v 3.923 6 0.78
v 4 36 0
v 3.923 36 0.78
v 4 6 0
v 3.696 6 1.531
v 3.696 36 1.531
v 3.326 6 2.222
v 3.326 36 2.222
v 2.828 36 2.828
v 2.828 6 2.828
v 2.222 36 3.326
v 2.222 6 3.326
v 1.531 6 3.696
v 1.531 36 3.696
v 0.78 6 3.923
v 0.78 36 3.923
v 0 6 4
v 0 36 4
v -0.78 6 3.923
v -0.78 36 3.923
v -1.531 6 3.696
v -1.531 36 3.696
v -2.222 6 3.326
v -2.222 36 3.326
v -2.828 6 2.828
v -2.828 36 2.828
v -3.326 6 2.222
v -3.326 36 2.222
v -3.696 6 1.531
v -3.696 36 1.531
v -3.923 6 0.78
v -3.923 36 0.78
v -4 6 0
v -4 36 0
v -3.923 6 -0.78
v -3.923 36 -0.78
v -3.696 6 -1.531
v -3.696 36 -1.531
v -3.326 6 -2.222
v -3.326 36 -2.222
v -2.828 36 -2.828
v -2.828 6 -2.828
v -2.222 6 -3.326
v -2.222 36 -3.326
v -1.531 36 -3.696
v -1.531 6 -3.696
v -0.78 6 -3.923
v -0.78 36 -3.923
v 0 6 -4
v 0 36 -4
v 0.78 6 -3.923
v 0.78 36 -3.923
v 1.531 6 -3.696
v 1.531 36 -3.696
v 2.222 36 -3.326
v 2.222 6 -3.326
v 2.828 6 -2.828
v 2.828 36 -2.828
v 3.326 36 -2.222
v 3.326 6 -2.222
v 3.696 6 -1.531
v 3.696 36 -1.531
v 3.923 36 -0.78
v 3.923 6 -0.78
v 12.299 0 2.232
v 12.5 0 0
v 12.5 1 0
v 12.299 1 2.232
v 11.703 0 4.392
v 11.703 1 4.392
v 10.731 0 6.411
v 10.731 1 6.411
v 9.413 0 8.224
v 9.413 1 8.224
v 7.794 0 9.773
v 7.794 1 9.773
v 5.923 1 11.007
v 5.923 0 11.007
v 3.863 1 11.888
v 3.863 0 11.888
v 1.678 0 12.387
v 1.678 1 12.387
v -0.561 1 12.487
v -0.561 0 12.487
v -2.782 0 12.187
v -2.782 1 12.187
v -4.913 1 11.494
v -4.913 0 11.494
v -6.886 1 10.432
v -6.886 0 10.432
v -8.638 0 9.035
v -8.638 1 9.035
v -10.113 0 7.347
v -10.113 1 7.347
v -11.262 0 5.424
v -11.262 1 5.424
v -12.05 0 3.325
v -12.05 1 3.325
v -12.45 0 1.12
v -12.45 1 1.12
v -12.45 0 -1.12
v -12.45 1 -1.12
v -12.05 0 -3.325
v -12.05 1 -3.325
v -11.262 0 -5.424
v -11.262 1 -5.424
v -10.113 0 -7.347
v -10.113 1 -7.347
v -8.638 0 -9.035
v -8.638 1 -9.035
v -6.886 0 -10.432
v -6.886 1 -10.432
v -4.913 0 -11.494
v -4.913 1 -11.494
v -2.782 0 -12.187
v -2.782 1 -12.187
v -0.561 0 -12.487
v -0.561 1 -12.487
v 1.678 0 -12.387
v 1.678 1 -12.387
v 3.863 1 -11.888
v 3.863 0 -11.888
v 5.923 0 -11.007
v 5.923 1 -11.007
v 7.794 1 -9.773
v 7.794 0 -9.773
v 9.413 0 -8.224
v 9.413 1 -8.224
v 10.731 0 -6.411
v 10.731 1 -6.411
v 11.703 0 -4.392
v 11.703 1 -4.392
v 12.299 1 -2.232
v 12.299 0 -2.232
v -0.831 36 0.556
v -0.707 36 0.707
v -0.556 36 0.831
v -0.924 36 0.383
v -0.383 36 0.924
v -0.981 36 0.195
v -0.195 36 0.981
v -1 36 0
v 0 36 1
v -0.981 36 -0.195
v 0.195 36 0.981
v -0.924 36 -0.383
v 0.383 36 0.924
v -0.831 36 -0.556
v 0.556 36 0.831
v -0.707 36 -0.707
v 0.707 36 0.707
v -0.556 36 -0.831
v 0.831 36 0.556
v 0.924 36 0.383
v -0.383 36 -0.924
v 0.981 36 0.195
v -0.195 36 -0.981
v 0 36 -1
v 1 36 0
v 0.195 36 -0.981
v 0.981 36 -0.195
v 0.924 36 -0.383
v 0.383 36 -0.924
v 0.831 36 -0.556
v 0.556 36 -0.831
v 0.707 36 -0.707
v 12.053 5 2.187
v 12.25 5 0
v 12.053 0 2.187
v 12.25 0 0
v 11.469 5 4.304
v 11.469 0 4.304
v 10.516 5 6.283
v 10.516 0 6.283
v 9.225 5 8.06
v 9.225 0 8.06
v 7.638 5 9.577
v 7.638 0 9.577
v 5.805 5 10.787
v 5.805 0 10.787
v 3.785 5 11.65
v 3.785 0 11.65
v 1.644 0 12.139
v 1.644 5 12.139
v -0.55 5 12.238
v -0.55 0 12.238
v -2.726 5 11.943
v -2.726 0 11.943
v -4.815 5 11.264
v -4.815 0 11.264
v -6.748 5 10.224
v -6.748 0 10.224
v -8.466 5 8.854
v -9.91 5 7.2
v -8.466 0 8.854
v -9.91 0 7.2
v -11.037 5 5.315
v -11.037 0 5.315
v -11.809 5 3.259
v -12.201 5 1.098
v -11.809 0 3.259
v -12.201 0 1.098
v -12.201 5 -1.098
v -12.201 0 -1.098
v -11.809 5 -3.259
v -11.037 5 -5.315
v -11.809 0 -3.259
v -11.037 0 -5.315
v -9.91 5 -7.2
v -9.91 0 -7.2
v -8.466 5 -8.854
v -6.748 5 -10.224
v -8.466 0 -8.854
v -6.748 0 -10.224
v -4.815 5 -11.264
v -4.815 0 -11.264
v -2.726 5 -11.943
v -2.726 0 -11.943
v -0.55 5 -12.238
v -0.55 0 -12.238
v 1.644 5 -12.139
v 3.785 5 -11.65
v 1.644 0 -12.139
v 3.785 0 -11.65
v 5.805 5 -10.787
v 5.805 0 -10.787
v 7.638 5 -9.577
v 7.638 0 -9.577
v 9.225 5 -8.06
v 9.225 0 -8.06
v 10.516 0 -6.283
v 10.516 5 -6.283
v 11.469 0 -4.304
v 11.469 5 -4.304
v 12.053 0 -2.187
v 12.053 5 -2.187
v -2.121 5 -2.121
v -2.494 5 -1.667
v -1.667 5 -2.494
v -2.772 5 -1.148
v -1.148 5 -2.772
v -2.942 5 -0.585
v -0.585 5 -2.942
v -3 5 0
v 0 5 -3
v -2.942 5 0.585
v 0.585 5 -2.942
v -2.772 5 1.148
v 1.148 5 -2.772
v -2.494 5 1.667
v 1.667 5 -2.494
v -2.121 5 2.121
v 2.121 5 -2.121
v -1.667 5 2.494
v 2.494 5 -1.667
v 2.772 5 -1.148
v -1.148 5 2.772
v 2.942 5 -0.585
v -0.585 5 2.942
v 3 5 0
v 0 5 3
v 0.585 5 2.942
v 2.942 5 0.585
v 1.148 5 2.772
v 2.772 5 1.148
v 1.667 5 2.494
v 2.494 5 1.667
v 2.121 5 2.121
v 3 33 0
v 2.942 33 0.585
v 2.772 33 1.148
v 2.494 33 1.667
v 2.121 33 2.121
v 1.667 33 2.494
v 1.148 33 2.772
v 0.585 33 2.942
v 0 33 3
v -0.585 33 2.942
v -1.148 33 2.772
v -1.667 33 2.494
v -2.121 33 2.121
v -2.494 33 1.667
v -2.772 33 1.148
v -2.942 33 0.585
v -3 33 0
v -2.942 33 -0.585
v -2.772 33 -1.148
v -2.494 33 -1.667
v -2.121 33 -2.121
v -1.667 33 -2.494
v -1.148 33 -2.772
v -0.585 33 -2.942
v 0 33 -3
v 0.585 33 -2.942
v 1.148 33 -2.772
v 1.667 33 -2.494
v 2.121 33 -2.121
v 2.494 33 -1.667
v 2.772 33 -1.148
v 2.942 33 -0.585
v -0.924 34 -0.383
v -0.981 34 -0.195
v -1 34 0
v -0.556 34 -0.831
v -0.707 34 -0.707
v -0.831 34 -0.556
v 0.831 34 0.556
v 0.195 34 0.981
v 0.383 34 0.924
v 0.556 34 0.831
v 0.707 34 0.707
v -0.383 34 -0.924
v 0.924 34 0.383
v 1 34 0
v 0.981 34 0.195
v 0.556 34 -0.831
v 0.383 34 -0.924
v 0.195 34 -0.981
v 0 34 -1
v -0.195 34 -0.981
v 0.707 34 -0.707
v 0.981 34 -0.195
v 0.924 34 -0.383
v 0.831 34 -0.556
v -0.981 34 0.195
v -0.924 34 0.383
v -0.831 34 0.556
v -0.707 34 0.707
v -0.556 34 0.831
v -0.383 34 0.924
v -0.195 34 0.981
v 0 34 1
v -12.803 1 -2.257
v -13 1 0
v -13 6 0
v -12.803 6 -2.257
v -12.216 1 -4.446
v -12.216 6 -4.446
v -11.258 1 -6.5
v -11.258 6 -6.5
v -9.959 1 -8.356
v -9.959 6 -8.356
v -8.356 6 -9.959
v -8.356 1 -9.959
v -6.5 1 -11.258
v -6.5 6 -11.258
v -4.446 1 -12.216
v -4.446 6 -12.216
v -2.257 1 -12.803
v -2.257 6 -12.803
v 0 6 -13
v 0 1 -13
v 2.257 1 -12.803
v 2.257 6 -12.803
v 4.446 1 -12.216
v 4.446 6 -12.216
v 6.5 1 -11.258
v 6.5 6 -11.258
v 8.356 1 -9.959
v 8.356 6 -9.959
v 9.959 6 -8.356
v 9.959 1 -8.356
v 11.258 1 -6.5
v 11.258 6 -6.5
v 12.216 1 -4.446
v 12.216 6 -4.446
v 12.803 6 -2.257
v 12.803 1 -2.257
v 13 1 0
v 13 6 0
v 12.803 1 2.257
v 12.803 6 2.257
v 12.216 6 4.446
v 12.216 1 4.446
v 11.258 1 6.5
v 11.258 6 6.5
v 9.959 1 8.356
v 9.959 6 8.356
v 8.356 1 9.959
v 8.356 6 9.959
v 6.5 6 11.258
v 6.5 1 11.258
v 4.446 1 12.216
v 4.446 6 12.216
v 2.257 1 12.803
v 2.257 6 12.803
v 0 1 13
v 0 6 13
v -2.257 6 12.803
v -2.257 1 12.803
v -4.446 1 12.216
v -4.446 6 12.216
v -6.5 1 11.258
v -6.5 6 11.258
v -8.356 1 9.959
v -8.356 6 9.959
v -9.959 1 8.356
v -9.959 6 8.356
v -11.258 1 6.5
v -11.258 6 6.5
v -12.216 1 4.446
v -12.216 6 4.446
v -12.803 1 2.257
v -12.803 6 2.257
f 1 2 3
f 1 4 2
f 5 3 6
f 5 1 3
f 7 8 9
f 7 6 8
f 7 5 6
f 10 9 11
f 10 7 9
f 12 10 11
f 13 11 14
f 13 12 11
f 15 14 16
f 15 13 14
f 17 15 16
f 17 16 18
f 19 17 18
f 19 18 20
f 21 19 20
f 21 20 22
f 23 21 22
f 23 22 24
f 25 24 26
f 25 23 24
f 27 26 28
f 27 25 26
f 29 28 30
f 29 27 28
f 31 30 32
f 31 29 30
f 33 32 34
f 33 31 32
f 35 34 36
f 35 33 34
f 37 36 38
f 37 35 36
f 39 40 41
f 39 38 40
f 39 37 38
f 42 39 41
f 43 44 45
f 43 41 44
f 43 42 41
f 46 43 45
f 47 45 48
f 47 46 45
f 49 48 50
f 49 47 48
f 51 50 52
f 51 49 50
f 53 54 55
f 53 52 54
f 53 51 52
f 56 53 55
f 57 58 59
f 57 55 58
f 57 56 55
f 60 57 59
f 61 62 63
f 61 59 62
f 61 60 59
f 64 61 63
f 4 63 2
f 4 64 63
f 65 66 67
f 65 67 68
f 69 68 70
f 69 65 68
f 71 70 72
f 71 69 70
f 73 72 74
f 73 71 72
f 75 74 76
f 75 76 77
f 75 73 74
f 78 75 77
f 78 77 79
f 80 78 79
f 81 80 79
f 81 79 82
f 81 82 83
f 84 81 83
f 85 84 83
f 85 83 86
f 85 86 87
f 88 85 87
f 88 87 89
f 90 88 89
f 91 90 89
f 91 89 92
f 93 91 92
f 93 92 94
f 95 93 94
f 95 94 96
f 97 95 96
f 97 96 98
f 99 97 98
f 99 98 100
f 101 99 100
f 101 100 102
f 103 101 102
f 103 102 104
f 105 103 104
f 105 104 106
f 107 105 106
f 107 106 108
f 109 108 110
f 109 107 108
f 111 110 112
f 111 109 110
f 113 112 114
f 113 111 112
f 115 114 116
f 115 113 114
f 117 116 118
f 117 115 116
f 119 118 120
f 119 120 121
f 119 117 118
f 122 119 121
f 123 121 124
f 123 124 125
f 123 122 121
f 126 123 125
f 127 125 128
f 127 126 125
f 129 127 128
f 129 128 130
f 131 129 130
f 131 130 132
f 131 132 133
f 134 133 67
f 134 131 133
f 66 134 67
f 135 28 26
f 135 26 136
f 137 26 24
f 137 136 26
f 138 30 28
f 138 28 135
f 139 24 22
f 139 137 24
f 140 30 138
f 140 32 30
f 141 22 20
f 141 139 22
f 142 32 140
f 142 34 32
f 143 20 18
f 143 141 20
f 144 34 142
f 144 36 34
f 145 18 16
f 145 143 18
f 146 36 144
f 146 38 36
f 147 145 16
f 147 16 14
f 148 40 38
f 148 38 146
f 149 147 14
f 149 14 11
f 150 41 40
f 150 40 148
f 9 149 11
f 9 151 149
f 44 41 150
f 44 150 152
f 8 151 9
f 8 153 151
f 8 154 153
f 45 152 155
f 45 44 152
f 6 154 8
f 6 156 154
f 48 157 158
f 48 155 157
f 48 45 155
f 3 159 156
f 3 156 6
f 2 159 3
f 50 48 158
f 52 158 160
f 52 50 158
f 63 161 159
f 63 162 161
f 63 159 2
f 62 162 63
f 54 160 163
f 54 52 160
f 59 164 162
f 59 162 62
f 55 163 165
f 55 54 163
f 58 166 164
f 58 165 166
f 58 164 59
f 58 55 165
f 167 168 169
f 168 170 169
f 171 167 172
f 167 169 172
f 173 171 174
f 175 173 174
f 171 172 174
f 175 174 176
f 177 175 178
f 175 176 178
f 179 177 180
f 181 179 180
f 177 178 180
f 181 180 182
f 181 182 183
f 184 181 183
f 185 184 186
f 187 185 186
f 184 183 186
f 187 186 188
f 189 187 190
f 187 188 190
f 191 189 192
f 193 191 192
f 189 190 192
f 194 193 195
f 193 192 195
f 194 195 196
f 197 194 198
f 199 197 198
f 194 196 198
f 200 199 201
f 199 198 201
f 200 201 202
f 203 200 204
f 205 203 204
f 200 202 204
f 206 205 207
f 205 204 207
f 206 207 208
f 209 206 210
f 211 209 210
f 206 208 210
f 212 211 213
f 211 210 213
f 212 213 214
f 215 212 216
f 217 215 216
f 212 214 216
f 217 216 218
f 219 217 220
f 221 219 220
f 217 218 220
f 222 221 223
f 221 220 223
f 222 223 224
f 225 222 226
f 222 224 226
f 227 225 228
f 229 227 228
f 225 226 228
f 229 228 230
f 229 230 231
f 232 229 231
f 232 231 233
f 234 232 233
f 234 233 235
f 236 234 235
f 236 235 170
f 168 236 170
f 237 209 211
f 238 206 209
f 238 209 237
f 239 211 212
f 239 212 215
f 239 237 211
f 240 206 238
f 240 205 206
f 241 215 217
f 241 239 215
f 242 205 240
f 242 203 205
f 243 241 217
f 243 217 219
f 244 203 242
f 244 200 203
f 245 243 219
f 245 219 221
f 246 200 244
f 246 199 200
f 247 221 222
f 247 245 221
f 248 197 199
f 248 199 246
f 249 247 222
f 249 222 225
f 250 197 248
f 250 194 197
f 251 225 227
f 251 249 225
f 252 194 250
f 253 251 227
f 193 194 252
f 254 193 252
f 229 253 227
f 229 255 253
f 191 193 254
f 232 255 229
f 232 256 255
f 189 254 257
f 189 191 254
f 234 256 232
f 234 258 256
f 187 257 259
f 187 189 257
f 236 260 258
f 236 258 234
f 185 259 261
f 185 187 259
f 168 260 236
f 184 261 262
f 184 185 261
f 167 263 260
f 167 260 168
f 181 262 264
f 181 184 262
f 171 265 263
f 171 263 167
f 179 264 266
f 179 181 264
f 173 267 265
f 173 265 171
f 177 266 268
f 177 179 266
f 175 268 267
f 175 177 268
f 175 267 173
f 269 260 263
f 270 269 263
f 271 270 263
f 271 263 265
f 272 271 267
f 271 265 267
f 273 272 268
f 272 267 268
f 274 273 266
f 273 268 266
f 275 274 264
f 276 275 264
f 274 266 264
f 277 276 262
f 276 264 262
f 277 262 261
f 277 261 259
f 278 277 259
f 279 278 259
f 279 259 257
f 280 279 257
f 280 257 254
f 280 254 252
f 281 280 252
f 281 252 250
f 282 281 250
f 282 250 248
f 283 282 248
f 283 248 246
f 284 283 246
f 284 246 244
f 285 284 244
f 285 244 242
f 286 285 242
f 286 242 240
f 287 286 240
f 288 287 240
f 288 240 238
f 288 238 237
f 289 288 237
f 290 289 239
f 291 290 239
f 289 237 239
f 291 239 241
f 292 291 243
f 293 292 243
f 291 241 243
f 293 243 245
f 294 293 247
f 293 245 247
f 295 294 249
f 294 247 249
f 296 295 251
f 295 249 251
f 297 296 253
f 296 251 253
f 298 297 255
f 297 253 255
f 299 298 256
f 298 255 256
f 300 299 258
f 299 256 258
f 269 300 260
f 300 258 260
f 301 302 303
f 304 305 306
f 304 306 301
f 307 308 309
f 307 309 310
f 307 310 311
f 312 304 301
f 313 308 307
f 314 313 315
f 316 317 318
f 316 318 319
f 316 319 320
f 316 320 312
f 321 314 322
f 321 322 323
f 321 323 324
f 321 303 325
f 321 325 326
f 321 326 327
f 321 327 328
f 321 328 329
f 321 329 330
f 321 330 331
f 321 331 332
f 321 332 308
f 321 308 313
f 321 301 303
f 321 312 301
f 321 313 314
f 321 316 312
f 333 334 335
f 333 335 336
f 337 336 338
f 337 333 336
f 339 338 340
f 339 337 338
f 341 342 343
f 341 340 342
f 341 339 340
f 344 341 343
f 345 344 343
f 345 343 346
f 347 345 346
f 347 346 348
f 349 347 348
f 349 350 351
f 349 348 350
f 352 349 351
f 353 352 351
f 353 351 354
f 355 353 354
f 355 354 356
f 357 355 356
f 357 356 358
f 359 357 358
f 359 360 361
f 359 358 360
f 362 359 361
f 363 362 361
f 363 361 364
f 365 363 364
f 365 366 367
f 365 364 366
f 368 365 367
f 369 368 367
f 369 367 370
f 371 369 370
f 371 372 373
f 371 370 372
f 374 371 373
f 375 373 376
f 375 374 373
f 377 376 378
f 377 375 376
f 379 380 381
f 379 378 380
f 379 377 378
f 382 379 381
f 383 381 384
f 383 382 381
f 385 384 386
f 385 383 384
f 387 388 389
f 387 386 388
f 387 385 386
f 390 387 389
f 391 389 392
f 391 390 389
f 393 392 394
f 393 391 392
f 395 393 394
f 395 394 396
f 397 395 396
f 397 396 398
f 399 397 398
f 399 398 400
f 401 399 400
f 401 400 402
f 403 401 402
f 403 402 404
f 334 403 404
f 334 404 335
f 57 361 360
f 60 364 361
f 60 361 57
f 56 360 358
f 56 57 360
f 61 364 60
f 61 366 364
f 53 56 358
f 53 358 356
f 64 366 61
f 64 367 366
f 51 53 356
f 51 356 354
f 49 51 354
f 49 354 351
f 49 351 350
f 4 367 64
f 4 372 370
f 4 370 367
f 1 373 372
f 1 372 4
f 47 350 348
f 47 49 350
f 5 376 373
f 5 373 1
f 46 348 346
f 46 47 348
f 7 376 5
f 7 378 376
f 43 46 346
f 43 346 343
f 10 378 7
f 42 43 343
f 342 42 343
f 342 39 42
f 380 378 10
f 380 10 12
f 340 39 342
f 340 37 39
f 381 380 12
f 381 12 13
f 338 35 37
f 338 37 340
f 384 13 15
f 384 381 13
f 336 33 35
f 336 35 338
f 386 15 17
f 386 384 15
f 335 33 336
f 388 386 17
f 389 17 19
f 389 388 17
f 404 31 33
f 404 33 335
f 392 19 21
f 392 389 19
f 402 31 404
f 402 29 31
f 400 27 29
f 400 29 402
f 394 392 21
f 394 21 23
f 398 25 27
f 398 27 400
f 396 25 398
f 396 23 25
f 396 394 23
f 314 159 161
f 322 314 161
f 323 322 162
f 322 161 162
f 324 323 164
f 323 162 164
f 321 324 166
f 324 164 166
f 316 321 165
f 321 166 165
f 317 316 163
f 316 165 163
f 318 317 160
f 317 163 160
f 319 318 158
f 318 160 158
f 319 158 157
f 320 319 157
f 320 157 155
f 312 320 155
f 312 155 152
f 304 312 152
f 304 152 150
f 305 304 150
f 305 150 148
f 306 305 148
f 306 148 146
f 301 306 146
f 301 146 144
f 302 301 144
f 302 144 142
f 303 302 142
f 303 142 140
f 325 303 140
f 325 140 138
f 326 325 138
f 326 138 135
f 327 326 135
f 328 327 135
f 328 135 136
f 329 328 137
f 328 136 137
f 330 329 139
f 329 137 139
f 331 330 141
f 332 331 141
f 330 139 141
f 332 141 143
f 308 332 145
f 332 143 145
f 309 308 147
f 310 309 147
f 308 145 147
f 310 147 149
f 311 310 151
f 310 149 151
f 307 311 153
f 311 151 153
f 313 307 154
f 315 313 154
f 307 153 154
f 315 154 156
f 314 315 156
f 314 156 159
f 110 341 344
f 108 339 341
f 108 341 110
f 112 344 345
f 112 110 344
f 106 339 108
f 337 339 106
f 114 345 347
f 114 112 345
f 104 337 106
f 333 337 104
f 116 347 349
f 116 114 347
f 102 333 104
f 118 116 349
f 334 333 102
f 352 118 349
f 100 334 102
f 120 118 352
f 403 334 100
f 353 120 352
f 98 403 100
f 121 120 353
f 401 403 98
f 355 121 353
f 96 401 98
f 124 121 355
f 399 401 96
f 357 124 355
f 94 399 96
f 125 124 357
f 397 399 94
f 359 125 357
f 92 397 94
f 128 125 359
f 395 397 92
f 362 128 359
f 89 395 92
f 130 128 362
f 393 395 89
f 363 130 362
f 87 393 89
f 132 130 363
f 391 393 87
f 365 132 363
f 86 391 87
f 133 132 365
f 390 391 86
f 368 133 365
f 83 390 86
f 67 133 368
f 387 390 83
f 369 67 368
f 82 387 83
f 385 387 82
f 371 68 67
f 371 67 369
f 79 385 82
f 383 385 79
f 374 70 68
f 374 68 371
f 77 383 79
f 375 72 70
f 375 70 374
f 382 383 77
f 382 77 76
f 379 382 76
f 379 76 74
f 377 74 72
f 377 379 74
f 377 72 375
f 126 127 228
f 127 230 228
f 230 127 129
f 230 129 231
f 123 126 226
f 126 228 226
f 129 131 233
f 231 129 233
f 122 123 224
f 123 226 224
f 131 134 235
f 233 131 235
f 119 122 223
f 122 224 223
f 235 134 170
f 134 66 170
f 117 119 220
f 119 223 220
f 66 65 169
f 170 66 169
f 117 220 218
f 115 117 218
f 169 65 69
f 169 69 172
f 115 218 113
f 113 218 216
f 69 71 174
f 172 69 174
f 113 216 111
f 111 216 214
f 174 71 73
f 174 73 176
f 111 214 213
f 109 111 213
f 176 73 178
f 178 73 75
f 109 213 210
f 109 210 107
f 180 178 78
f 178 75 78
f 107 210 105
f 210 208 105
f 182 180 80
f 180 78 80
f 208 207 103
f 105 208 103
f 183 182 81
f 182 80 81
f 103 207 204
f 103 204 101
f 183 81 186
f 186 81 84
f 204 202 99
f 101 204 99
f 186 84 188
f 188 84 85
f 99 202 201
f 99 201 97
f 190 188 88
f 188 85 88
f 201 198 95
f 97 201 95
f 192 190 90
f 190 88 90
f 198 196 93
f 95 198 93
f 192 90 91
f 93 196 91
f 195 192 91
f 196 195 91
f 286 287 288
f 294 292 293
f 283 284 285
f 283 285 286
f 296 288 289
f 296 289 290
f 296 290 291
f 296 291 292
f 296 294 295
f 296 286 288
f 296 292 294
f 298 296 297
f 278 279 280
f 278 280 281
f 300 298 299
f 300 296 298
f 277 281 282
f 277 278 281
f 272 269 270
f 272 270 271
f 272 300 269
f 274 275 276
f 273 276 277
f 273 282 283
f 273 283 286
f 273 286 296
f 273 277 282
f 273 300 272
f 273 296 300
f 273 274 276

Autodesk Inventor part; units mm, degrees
ref_plane "YZ Plane" through (0, 0, 0) normal (1, 0, 0) x (0, 1, 0)
ref_plane "XZ Plane" through (0, 0, 0) normal (0, 1, 0) x (-1, 0, 0)
ref_plane "XY Plane" through (0, 0, 0) normal (0, 0, 1) x (1, 0, 0)
sketch "Sketch1" plane through (0, 0, 0) normal (0, 1, 0) x (-1, 0, 0)
  circle A0 centre (0, 0) radius 13
  dimension "d0" = 26
extrude "Extrusion1" add sketch "Sketch1" along normal blind 6
sketch "Sketch2" plane through (0, 0, 0) normal (0, -1, 0) x (1, 0, 0)
  circle A0 centre (0, 0) radius 12.5
  circle A1 centre (0, 0) radius 13 projected
  dimension "d3" = 25
extrude "Extrusion2" cut sketch "Sketch2" against normal blind 1
sketch "Sketch3" plane through (0, 0, 0) normal (0, -1, 0) x (1, 0, 0)
  circle A0 centre (0, 0) radius 12.25
  dimension "d6" = 24.5
extrude "Extrusion3" cut sketch "Sketch3" against normal blind 5
sketch "Sketch4" plane through (0, 6, 0) normal (0, 1, 0) x (1, 0, 0)
  circle A0 centre (0, 0) radius 4
  dimension "d9" = 8
extrude "Extrusion4" add sketch "Sketch4" along normal blind 30
sketch "Sketch5" plane through (0, 36, 0) normal (0, 1, 0) x (1, 0, 0)
  circle A0 centre (0, 0) radius 4 projected
  circle A1 centre (0, 0) radius 1
  dimension "d12" = 2
extrude "Extrusion5" cut sketch "Sketch5" against normal blind 2 contours A1
sketch "Sketch6" plane through (0, 5, 0) normal (0, -1, 0) x (1, 0, 0)
  circle A0 centre (0, 0) radius 3
  dimension "d15" = 6
extrude "Extrusion6" cut sketch "Sketch6" against normal blind 28
properties part number "Actuador"
